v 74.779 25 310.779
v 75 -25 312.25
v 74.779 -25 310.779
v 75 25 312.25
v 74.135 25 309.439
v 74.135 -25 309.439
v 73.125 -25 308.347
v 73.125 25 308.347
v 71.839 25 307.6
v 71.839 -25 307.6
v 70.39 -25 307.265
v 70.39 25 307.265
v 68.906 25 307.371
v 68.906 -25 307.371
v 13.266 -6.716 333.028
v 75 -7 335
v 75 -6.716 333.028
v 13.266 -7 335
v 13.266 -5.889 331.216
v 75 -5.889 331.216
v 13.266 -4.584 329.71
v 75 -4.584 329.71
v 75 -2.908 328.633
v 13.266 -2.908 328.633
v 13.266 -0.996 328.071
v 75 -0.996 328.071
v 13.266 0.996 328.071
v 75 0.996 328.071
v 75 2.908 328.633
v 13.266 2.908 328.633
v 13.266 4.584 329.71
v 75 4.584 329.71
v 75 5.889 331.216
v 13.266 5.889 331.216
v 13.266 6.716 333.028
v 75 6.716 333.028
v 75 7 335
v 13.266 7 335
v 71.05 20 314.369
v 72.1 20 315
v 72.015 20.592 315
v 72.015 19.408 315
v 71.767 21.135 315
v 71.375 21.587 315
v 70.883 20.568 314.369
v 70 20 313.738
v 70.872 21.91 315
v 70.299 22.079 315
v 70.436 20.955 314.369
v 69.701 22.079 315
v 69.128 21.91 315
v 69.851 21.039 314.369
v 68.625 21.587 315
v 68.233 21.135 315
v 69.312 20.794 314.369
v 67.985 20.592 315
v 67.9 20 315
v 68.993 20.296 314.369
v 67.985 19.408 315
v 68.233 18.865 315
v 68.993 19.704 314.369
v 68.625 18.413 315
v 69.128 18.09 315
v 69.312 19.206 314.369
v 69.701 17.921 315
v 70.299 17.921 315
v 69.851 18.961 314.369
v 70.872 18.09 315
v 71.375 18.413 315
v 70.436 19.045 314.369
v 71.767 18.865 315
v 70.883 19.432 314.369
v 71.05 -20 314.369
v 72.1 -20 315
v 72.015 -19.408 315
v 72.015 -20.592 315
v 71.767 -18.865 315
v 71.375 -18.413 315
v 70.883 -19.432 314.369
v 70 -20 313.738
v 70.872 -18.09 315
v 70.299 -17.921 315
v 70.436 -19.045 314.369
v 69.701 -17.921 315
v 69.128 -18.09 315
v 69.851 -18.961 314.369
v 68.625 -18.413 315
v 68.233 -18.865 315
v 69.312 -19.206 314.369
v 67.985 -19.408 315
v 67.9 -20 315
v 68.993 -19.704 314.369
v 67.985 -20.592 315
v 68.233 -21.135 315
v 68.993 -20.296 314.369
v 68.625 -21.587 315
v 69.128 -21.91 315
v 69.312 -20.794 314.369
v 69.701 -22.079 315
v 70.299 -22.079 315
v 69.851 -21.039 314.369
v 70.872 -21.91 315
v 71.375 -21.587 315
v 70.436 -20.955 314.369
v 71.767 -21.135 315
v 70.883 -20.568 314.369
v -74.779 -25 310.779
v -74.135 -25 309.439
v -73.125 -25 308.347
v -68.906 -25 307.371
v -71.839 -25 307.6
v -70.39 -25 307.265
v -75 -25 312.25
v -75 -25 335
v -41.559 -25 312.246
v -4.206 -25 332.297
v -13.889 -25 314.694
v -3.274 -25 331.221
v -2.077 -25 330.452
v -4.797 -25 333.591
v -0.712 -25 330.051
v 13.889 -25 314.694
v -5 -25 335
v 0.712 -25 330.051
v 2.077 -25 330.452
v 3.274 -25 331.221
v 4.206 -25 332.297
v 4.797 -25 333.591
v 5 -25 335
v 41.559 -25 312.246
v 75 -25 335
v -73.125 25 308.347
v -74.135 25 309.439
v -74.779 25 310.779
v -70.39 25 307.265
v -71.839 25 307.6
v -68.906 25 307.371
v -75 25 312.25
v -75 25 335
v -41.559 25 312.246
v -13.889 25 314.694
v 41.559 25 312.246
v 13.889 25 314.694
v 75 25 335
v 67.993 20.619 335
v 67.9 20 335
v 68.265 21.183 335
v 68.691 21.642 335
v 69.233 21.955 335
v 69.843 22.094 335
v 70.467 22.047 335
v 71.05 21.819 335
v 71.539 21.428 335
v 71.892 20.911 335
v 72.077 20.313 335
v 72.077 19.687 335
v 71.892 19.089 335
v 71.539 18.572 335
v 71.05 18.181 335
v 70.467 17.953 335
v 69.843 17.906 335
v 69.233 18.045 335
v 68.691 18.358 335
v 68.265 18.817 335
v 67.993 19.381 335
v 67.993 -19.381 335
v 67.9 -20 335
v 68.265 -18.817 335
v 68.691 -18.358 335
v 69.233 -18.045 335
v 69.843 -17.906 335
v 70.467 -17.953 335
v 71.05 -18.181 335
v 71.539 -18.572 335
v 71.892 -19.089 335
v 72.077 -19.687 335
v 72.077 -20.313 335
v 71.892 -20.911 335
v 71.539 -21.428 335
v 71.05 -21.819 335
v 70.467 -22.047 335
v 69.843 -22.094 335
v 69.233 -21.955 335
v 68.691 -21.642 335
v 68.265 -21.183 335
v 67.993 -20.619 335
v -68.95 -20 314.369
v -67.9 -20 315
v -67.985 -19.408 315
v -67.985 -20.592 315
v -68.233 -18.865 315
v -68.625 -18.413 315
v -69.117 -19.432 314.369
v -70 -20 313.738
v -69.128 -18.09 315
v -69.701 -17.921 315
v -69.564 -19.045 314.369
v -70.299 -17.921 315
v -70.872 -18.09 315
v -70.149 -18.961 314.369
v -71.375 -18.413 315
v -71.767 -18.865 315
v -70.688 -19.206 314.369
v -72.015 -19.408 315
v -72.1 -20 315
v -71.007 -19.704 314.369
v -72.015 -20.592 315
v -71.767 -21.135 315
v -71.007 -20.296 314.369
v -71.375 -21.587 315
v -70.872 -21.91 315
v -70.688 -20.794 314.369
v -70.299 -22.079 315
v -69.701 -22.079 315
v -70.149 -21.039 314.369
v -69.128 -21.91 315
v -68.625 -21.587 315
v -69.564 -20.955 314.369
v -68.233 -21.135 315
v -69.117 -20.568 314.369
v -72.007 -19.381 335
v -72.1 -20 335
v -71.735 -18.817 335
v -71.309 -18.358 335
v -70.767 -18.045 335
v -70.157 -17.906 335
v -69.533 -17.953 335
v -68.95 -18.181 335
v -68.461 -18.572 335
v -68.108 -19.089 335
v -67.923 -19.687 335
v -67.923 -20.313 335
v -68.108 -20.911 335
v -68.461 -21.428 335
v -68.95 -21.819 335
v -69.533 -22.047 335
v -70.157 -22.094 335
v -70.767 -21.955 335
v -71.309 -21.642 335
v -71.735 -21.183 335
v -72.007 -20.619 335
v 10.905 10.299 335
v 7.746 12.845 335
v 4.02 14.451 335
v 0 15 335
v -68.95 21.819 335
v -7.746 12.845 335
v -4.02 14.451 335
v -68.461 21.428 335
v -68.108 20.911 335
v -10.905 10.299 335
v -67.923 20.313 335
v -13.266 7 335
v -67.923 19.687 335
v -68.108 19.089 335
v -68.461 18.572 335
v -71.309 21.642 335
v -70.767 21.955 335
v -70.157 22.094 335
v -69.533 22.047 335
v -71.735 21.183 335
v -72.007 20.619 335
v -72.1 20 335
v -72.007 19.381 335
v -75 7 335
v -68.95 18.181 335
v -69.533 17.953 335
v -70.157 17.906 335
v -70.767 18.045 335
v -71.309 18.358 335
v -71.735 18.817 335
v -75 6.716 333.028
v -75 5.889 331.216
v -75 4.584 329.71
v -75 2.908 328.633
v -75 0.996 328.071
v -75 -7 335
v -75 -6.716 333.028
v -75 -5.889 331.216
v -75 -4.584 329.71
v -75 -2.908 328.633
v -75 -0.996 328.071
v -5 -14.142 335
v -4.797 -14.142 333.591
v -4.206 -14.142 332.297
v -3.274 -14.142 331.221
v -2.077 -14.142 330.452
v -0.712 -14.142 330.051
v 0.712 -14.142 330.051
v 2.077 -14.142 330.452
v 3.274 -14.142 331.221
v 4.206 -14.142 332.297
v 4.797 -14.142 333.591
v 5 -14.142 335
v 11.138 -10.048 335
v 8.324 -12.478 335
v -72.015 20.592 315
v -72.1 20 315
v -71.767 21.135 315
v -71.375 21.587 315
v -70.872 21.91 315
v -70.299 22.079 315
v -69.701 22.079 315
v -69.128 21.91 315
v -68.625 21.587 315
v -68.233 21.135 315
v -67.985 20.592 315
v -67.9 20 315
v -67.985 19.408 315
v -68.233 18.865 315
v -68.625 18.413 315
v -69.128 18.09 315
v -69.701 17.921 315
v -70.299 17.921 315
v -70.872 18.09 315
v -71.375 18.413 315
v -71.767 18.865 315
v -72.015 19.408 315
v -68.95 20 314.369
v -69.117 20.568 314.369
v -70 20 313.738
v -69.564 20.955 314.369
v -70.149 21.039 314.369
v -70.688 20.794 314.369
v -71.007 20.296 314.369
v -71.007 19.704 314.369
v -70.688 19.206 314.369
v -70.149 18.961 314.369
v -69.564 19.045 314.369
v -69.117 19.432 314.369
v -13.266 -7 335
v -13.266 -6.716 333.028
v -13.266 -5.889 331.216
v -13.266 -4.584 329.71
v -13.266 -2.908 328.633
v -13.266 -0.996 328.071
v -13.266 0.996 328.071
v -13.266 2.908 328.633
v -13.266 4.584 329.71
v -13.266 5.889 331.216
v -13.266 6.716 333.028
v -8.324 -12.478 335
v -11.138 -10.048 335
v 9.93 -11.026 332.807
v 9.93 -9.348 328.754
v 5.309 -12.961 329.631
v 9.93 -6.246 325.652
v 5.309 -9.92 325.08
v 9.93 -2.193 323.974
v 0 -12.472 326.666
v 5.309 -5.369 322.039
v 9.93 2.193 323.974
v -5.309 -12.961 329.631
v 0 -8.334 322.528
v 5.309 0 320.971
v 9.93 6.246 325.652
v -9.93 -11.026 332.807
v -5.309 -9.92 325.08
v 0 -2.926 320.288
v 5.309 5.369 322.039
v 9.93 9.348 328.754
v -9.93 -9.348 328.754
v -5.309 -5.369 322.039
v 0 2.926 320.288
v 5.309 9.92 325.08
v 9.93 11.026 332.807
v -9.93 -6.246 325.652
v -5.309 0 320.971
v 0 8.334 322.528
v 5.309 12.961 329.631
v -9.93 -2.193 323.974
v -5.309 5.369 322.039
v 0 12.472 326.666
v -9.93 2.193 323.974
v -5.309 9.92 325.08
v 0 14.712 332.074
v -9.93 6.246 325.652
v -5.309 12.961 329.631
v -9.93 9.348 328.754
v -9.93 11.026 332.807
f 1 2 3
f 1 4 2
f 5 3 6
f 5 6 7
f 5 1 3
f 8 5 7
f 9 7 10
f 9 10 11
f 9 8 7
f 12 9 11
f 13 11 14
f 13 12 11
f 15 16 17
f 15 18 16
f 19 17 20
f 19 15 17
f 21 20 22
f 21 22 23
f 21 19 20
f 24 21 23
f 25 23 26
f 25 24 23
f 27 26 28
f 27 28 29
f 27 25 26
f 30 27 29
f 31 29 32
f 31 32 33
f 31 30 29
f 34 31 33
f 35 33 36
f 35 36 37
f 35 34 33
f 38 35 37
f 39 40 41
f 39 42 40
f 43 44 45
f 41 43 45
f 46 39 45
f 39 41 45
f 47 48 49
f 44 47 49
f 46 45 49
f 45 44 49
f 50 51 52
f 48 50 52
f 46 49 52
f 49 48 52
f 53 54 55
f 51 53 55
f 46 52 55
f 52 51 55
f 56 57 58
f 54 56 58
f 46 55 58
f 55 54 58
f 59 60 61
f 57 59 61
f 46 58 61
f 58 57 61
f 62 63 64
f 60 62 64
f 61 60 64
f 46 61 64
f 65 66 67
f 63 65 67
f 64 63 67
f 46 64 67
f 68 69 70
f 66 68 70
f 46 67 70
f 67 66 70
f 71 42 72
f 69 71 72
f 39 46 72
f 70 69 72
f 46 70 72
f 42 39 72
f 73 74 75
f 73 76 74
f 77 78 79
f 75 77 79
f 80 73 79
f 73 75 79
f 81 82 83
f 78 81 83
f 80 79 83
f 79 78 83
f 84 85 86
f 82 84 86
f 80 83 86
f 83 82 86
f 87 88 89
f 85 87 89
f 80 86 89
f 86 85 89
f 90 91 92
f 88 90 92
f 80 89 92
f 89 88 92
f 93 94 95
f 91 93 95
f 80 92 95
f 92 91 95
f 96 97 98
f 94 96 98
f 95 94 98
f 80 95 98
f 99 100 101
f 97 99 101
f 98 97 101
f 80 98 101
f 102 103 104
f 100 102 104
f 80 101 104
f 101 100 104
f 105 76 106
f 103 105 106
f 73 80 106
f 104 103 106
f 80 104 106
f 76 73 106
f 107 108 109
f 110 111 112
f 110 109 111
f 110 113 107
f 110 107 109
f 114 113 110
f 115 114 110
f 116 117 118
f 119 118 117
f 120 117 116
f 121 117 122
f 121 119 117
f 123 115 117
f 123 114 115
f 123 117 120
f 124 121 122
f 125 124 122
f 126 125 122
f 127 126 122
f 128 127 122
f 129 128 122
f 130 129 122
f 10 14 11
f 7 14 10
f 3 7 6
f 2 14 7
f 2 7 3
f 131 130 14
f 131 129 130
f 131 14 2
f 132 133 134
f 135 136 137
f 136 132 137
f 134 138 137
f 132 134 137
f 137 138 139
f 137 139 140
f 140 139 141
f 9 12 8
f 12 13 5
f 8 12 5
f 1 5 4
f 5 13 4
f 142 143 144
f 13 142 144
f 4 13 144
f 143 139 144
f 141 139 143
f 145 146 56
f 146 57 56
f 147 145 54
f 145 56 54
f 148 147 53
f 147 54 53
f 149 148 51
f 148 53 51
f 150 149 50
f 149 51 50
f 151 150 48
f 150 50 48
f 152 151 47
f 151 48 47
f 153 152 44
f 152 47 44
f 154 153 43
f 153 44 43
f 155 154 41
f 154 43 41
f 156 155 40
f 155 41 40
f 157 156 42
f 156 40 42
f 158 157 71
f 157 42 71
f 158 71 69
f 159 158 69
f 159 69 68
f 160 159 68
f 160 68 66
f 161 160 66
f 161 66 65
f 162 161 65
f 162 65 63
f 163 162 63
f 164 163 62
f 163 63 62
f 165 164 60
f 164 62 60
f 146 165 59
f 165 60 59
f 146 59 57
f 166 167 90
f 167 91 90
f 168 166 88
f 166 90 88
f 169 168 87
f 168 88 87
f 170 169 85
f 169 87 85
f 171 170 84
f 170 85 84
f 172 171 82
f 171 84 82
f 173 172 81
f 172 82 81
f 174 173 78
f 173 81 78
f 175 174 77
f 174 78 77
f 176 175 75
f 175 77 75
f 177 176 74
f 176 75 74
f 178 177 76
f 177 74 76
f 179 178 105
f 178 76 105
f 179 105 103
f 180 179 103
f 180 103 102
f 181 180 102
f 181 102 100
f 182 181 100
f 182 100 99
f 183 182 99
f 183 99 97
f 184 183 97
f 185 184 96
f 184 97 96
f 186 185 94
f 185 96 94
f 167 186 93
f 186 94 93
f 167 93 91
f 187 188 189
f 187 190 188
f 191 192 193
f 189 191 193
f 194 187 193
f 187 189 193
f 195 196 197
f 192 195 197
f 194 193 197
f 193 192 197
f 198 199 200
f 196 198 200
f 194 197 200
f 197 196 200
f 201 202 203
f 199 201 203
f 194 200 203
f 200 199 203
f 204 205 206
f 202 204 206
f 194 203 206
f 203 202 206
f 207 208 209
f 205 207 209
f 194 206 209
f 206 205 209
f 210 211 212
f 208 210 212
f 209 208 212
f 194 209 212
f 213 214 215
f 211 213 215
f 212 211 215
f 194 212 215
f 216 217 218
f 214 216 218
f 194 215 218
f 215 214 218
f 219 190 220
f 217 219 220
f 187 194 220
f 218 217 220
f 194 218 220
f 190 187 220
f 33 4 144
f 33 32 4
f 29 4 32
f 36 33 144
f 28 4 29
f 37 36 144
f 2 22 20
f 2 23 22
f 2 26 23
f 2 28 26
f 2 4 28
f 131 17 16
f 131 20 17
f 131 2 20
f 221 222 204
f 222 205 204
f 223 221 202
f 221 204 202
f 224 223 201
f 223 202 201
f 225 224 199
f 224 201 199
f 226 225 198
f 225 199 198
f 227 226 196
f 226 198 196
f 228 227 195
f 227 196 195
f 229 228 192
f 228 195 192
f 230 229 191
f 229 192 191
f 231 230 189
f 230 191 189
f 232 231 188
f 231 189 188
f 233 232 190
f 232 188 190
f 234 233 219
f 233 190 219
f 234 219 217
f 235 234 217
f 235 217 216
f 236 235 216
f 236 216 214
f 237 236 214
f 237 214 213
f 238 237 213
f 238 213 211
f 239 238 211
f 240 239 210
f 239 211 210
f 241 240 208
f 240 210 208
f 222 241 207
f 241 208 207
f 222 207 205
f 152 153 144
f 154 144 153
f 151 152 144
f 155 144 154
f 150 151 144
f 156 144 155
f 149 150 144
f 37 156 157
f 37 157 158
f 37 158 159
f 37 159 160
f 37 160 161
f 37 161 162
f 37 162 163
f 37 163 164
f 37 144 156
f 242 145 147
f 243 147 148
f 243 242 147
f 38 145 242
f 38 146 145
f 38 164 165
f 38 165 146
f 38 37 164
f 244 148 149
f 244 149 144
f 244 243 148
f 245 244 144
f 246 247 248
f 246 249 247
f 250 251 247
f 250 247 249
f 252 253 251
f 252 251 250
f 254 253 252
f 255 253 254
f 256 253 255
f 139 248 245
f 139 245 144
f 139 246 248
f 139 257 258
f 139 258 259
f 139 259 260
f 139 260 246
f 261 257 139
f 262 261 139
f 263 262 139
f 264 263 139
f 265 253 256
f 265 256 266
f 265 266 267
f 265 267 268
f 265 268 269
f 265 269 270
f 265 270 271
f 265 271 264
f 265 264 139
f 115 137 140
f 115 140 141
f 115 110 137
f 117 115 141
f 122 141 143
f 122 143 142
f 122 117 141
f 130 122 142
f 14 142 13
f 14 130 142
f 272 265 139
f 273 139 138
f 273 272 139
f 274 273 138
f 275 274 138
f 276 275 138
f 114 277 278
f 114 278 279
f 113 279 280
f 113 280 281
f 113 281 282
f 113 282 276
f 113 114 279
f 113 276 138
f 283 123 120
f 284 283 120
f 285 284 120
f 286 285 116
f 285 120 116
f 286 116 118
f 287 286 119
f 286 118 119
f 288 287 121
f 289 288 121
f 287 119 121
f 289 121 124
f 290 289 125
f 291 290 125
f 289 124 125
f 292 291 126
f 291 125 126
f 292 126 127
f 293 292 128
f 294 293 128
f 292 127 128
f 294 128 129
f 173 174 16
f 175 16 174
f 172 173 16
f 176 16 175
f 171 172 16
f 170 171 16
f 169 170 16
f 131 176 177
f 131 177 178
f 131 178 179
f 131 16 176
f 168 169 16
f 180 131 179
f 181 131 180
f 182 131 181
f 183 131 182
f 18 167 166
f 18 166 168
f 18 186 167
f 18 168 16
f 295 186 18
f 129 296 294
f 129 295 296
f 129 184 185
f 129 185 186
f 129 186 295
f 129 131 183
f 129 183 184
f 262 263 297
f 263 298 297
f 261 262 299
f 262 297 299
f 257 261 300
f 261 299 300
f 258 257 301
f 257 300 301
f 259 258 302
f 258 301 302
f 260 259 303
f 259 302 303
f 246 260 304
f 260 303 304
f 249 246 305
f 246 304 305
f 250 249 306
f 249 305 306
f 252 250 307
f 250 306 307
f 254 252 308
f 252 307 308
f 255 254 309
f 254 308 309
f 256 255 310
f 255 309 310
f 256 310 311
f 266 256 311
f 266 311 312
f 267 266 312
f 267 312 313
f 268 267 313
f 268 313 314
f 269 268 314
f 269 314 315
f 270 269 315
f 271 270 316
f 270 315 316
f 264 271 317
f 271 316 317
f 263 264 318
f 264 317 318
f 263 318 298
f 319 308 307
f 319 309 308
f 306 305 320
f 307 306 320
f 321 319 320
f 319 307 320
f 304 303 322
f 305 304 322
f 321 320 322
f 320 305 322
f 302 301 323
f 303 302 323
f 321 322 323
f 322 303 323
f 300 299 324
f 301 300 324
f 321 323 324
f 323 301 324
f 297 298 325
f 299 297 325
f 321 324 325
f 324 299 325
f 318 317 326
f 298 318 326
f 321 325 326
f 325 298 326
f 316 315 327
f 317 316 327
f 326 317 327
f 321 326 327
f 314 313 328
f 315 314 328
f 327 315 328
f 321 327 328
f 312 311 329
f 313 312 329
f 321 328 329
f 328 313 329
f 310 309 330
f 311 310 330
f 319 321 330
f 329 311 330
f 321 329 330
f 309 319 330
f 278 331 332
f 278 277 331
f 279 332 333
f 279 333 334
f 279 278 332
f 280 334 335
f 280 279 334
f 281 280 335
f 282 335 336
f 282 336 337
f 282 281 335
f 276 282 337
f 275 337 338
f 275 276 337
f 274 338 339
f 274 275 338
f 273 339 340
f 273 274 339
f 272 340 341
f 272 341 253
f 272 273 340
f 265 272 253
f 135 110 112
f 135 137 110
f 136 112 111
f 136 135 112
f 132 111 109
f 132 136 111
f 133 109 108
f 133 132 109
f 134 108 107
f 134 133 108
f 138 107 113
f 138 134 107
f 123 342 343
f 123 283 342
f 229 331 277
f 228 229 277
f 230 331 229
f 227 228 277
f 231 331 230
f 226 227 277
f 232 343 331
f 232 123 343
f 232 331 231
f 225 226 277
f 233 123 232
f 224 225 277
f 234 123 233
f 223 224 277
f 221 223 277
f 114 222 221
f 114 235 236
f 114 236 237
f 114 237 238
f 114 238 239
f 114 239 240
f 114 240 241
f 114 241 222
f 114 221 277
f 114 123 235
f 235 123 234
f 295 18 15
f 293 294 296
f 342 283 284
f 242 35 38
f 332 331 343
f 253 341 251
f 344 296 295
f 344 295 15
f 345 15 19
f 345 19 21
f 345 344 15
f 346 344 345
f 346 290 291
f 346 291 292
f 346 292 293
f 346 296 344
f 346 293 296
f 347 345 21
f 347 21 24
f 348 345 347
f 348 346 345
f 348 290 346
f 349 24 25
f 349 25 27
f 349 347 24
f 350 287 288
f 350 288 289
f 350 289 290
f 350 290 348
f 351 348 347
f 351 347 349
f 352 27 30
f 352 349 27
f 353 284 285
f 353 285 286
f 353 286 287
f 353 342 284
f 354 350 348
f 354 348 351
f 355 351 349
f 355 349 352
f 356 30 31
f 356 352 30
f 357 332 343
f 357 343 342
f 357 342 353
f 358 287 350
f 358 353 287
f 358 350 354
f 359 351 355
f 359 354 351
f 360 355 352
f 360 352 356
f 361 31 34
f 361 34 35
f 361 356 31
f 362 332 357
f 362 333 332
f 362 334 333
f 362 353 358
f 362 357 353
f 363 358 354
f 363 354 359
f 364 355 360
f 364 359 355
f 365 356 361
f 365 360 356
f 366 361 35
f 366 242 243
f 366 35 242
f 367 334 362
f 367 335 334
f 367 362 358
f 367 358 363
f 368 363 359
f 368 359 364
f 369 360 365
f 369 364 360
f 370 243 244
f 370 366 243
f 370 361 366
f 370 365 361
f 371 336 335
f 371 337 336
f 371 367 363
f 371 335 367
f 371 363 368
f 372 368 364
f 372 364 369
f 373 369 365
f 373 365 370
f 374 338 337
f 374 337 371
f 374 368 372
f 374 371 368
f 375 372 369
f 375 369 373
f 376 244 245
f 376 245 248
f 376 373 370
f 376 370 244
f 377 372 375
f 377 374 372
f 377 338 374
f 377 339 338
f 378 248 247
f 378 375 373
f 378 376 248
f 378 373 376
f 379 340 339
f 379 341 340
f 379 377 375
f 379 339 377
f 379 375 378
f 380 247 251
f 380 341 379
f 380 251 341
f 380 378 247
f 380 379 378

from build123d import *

# Parameters (mm, degrees)
F1_DEPTH = 25
F5_D     = 4.2
F5_DEPTH = 20
F5_TIP   = 1.2618073
F6_R     = 5


with BuildPart() as f1:
    # F0 (on Front) → F1 (new body, symmetric)
    with BuildSketch(Plane.XZ):
        with BuildLine():
            ThreePointArc((0, 315), (37.7725508345, 312.7270925319), (75, 305.9411708156))
            Line((75, 305.9411708156), (75, 335))
            Line((75, 335), (0, 335))
            Line((0, 335), (0, 315))
        make_face()
        with BuildLine():
            ThreePointArc((-75, 305.9411708156), (-37.7725508345, 312.7270925319), (0, 315))
            Line((0, 315), (0, 335))
            Line((0, 335), (-75, 335))
            Line((-75, 335), (-75, 305.9411708156))
        make_face()
    extrude(amount=F1_DEPTH, both=True)

    # F2 (on face) → F3 (revolve, cut)
    with BuildSketch(Plane.XY.offset(335)):
        with BuildLine():
            Line((-13.2664991614, 7), (-75, 7))
            Line((-75, 7), (-75, 0))
            Line((-75, 0), (-15, 0))
            ThreePointArc((-15, 0), (-14.5601766373, 3.6057254872), (-13.2664991614, 7))
        make_face()
        with BuildLine():
            ThreePointArc((13.2664991614, 7), (0, 15), (-13.2664991614, 7))
            ThreePointArc((-13.2664991614, 7), (-14.5601766373, 3.6057254872), (-15, 0))
            Line((-15, 0), (-13.2664991614, 0))
            Line((-13.2664991614, 0), (13.2664991614, 0))
            Line((13.2664991614, 0), (15, 0))
            ThreePointArc((15, 0), (14.5601766373, 3.6057254872), (13.2664991614, 7))
        make_face()
        with BuildLine():
            Line((75, 7), (13.2664991614, 7))
            ThreePointArc((13.2664991614, 7), (14.5601766373, 3.6057254872), (15, 0))
            Line((15, 0), (75, 0))
            Line((75, 0), (75, 7))
        make_face()
    revolve(axis=Axis((-44.1332495807, 0, 335), (1, 0, 0)), mode=Mode.SUBTRACT)

    # F5
    with Locations(Plane.XY.offset(335)):
        with Locations((-70, 20), (-70, -20), (70, 20), (70, -20)):
            Hole(F5_D / 2, depth=F5_DEPTH)
            with Locations((0, 0, -(F5_DEPTH + F5_TIP / 2))):  # 118° drill point
                Cone(0, F5_D / 2, F5_TIP, mode=Mode.SUBTRACT)

    # F6
    f6_edges = [f1.edges().sort_by_distance(p)[0] for p in [
        (-75, 0, 305.941171),
        (75, 0, 305.941171),
    ]]
    fillet(f6_edges, radius=F6_R)

    # F7 (on face) → F8 (revolve, cut)
    with BuildSketch(Plane.XY.offset(335)):
        with BuildLine():
            Line((0, 0), (-5, 0))
            Line((-5, 0), (-5, -14.1421356237))
            ThreePointArc((-5, -14.1421356237), (-2.5365296809, -14.7839783948), (0, -15))
            Line((0, -15), (0, 0))
        make_face()
        with BuildLine():
            ThreePointArc((0, -15), (-2.5365296809, -14.7839783948), (-5, -14.1421356237))
            Line((-5, -14.1421356237), (-5, -25))
            Line((-5, -25), (0, -25))
            Line((0, -25), (0, -15))
        make_face()
    revolve(axis=Axis((0, -12.5, 335), (0, -1, 0)), mode=Mode.SUBTRACT)


solid = f1.part
